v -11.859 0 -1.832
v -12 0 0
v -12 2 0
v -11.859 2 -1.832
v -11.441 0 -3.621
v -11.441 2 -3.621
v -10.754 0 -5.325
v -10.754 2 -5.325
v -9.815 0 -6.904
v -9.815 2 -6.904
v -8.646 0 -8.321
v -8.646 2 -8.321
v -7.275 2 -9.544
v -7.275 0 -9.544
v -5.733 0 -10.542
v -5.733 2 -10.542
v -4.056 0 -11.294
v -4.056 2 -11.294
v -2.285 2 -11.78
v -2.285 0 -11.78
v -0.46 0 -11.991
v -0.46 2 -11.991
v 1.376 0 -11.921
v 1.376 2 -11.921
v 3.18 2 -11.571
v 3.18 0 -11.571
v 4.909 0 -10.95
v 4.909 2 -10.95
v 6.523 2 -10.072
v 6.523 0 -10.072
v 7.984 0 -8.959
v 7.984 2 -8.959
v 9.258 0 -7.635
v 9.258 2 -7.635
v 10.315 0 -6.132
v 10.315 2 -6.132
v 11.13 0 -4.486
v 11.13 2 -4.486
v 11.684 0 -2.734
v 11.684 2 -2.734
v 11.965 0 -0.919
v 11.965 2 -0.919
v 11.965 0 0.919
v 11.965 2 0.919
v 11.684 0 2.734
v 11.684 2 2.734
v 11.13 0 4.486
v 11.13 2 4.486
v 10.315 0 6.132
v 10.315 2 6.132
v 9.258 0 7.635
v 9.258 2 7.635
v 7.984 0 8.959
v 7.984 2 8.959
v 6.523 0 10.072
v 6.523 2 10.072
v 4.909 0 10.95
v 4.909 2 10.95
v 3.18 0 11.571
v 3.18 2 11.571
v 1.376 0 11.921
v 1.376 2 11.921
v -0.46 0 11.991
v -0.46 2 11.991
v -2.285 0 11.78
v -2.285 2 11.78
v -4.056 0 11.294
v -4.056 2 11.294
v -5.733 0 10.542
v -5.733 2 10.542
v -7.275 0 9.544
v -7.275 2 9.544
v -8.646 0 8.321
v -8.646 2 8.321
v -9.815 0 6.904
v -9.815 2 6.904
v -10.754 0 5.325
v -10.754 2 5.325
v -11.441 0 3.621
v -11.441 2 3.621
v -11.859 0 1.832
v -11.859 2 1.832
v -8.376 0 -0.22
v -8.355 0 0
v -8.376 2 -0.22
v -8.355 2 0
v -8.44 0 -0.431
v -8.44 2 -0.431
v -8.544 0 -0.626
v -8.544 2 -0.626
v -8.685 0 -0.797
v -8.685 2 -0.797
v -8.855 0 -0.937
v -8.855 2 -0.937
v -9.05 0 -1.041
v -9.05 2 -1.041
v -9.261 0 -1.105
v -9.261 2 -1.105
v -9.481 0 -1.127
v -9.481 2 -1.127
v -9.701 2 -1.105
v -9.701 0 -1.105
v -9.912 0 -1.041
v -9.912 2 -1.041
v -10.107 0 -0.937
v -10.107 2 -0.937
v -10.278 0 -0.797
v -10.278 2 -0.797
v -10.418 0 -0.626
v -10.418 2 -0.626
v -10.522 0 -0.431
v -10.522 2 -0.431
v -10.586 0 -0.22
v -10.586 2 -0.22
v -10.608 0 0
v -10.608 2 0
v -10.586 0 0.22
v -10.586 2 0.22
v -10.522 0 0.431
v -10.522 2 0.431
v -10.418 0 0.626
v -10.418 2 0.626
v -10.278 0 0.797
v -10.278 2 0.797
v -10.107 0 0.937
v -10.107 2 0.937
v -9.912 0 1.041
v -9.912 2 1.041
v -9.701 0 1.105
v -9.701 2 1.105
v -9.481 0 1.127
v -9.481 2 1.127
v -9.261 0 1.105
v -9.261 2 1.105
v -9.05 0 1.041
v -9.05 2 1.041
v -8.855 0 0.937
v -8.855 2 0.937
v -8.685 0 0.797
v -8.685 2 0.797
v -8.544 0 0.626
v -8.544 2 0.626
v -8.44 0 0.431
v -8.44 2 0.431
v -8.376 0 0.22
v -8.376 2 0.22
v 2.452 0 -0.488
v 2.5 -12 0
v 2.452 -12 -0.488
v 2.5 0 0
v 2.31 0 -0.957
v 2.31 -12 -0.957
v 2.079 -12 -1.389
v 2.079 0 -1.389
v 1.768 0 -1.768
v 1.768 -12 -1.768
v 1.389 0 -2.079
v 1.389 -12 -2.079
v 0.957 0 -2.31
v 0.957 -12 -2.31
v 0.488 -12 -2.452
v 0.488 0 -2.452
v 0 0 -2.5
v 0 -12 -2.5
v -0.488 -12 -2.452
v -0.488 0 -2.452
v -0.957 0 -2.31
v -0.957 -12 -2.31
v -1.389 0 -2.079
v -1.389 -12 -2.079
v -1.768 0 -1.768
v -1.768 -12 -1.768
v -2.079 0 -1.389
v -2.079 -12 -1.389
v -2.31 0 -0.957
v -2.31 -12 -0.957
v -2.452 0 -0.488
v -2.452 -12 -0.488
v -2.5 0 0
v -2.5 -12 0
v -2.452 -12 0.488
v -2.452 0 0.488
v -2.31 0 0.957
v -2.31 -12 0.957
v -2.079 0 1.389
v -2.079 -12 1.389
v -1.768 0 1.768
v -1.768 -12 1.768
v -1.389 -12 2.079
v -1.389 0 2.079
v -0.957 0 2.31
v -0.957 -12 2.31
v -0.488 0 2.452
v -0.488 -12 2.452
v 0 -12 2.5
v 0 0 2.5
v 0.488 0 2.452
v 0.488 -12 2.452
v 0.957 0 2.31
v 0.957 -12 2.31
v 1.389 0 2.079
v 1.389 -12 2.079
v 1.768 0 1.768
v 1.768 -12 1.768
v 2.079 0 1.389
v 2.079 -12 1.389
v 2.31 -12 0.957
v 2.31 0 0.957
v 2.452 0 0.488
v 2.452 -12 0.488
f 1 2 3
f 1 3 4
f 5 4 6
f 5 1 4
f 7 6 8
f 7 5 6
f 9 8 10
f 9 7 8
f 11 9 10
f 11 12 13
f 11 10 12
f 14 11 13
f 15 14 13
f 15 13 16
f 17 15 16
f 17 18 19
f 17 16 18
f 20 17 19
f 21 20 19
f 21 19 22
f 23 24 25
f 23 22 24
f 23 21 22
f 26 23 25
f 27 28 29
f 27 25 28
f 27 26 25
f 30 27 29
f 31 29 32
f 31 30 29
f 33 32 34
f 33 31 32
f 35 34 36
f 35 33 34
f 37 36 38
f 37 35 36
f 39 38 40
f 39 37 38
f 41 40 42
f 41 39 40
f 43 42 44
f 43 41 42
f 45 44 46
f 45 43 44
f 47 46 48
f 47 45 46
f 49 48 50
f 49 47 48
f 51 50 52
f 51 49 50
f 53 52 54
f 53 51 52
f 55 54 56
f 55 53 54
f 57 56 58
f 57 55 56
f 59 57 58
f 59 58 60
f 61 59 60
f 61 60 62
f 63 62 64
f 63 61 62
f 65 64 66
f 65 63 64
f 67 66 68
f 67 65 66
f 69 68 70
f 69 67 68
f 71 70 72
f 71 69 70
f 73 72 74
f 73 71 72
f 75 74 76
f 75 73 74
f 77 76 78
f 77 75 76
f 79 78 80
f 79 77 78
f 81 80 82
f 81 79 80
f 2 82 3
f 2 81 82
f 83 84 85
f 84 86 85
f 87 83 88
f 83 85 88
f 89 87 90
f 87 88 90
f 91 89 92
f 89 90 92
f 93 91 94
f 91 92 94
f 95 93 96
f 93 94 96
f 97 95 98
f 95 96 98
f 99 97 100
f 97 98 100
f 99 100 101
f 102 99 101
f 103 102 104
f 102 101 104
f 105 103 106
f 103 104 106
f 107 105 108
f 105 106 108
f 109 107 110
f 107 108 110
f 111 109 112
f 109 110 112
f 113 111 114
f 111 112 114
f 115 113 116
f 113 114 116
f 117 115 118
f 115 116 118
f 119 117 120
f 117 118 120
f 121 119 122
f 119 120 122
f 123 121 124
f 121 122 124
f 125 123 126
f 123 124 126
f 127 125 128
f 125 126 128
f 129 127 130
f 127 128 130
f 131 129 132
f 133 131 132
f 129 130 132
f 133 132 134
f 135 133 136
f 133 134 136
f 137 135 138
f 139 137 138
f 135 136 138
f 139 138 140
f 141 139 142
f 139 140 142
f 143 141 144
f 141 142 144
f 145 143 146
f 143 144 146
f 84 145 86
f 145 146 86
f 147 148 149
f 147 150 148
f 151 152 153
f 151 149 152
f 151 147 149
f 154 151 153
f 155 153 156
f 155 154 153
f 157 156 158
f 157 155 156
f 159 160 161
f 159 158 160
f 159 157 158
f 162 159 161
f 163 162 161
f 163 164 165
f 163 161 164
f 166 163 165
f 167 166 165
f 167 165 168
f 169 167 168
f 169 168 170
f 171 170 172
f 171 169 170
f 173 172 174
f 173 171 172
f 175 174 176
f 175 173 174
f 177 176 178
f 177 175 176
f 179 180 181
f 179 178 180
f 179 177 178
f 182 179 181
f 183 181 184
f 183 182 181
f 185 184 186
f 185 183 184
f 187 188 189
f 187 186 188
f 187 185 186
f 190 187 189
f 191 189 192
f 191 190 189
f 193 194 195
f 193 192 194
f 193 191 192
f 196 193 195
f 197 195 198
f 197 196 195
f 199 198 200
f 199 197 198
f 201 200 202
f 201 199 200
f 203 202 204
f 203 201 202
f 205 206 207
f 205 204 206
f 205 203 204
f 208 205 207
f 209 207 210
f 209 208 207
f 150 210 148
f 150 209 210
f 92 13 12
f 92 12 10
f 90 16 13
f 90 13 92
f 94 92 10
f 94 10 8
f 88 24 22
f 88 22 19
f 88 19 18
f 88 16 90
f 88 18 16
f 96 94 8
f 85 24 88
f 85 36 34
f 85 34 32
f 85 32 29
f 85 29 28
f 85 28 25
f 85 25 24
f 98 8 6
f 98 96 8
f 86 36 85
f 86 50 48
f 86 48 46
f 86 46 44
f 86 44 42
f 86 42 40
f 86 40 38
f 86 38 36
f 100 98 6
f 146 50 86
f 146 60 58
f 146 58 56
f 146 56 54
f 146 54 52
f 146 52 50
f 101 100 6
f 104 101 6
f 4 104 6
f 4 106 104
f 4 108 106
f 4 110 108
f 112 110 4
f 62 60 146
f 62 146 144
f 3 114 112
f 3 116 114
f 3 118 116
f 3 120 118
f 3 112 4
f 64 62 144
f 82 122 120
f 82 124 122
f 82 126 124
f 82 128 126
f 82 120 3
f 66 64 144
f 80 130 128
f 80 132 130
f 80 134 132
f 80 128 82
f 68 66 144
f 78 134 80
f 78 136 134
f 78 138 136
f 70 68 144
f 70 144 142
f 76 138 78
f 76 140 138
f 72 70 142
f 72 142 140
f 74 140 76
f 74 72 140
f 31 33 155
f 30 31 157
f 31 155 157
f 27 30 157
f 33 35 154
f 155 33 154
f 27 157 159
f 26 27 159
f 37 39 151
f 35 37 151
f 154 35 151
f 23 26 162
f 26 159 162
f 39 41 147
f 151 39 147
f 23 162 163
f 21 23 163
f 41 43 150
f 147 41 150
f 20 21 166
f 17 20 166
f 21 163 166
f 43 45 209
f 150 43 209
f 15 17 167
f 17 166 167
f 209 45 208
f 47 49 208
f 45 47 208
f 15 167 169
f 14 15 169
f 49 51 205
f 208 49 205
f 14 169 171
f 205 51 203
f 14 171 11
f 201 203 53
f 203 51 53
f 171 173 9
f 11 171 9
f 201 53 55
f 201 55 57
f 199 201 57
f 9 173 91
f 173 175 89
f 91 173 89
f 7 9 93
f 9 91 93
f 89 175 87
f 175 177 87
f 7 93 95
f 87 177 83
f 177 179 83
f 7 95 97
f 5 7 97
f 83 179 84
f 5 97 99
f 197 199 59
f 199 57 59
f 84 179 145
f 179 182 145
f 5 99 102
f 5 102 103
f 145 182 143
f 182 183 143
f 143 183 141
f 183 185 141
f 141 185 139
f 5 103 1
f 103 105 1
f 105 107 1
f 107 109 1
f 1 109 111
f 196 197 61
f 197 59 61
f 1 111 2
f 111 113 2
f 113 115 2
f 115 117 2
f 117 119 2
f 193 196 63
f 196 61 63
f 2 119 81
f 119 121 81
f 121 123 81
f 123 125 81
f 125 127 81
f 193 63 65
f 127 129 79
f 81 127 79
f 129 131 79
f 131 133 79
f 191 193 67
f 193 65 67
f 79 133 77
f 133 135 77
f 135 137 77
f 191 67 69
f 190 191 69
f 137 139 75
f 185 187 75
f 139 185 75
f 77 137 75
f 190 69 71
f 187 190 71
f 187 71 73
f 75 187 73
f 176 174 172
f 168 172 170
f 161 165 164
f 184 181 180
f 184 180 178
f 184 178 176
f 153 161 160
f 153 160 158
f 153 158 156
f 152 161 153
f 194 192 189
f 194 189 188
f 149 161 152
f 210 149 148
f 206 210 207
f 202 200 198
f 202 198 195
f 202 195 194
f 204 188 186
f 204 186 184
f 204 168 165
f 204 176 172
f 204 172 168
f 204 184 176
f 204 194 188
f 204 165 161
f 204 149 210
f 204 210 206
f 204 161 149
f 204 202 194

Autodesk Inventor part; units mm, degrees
ref_plane "YZ Plane" through (0, 0, 0) normal (1, 0, 0) x (0, 1, 0)
ref_plane "XZ Plane" through (0, 0, 0) normal (0, 1, 0) x (-1, 0, 0)
ref_plane "XY Plane" through (0, 0, 0) normal (0, 0, 1) x (1, 0, 0)
sketch "Sketch1" plane through (0, 0, 0) normal (0, 1, 0) x (-1, 0, 0)
  circle A0 centre (0, 0) radius 12
  dimension "sa_diameter" = 24
extrude "Extrusion1" add sketch "Sketch1" along normal blind 2
sketch "Sketch2" plane through (0, 0, 0) normal (0, -1, 0) x (1, 0, 0)
  circle A0 centre (0, 0) radius 2.5
  dimension "d4" = 5
extrude "Extrusion2" add sketch "Sketch2" along normal blind 12
sketch "Sketch3" plane through (0, 2, 0) normal (0, 1, 0) x (1, 0, 0)
  circle A0 centre (-9.4812, 0) radius 1.1266
  point P0 (0, 0)
  dimension "d8" = 9.4812
  dimension "d9" = 2.2531
extrude "Extrusion3" cut sketch "Sketch3" against normal up to next
properties part number "Servo_arm"
